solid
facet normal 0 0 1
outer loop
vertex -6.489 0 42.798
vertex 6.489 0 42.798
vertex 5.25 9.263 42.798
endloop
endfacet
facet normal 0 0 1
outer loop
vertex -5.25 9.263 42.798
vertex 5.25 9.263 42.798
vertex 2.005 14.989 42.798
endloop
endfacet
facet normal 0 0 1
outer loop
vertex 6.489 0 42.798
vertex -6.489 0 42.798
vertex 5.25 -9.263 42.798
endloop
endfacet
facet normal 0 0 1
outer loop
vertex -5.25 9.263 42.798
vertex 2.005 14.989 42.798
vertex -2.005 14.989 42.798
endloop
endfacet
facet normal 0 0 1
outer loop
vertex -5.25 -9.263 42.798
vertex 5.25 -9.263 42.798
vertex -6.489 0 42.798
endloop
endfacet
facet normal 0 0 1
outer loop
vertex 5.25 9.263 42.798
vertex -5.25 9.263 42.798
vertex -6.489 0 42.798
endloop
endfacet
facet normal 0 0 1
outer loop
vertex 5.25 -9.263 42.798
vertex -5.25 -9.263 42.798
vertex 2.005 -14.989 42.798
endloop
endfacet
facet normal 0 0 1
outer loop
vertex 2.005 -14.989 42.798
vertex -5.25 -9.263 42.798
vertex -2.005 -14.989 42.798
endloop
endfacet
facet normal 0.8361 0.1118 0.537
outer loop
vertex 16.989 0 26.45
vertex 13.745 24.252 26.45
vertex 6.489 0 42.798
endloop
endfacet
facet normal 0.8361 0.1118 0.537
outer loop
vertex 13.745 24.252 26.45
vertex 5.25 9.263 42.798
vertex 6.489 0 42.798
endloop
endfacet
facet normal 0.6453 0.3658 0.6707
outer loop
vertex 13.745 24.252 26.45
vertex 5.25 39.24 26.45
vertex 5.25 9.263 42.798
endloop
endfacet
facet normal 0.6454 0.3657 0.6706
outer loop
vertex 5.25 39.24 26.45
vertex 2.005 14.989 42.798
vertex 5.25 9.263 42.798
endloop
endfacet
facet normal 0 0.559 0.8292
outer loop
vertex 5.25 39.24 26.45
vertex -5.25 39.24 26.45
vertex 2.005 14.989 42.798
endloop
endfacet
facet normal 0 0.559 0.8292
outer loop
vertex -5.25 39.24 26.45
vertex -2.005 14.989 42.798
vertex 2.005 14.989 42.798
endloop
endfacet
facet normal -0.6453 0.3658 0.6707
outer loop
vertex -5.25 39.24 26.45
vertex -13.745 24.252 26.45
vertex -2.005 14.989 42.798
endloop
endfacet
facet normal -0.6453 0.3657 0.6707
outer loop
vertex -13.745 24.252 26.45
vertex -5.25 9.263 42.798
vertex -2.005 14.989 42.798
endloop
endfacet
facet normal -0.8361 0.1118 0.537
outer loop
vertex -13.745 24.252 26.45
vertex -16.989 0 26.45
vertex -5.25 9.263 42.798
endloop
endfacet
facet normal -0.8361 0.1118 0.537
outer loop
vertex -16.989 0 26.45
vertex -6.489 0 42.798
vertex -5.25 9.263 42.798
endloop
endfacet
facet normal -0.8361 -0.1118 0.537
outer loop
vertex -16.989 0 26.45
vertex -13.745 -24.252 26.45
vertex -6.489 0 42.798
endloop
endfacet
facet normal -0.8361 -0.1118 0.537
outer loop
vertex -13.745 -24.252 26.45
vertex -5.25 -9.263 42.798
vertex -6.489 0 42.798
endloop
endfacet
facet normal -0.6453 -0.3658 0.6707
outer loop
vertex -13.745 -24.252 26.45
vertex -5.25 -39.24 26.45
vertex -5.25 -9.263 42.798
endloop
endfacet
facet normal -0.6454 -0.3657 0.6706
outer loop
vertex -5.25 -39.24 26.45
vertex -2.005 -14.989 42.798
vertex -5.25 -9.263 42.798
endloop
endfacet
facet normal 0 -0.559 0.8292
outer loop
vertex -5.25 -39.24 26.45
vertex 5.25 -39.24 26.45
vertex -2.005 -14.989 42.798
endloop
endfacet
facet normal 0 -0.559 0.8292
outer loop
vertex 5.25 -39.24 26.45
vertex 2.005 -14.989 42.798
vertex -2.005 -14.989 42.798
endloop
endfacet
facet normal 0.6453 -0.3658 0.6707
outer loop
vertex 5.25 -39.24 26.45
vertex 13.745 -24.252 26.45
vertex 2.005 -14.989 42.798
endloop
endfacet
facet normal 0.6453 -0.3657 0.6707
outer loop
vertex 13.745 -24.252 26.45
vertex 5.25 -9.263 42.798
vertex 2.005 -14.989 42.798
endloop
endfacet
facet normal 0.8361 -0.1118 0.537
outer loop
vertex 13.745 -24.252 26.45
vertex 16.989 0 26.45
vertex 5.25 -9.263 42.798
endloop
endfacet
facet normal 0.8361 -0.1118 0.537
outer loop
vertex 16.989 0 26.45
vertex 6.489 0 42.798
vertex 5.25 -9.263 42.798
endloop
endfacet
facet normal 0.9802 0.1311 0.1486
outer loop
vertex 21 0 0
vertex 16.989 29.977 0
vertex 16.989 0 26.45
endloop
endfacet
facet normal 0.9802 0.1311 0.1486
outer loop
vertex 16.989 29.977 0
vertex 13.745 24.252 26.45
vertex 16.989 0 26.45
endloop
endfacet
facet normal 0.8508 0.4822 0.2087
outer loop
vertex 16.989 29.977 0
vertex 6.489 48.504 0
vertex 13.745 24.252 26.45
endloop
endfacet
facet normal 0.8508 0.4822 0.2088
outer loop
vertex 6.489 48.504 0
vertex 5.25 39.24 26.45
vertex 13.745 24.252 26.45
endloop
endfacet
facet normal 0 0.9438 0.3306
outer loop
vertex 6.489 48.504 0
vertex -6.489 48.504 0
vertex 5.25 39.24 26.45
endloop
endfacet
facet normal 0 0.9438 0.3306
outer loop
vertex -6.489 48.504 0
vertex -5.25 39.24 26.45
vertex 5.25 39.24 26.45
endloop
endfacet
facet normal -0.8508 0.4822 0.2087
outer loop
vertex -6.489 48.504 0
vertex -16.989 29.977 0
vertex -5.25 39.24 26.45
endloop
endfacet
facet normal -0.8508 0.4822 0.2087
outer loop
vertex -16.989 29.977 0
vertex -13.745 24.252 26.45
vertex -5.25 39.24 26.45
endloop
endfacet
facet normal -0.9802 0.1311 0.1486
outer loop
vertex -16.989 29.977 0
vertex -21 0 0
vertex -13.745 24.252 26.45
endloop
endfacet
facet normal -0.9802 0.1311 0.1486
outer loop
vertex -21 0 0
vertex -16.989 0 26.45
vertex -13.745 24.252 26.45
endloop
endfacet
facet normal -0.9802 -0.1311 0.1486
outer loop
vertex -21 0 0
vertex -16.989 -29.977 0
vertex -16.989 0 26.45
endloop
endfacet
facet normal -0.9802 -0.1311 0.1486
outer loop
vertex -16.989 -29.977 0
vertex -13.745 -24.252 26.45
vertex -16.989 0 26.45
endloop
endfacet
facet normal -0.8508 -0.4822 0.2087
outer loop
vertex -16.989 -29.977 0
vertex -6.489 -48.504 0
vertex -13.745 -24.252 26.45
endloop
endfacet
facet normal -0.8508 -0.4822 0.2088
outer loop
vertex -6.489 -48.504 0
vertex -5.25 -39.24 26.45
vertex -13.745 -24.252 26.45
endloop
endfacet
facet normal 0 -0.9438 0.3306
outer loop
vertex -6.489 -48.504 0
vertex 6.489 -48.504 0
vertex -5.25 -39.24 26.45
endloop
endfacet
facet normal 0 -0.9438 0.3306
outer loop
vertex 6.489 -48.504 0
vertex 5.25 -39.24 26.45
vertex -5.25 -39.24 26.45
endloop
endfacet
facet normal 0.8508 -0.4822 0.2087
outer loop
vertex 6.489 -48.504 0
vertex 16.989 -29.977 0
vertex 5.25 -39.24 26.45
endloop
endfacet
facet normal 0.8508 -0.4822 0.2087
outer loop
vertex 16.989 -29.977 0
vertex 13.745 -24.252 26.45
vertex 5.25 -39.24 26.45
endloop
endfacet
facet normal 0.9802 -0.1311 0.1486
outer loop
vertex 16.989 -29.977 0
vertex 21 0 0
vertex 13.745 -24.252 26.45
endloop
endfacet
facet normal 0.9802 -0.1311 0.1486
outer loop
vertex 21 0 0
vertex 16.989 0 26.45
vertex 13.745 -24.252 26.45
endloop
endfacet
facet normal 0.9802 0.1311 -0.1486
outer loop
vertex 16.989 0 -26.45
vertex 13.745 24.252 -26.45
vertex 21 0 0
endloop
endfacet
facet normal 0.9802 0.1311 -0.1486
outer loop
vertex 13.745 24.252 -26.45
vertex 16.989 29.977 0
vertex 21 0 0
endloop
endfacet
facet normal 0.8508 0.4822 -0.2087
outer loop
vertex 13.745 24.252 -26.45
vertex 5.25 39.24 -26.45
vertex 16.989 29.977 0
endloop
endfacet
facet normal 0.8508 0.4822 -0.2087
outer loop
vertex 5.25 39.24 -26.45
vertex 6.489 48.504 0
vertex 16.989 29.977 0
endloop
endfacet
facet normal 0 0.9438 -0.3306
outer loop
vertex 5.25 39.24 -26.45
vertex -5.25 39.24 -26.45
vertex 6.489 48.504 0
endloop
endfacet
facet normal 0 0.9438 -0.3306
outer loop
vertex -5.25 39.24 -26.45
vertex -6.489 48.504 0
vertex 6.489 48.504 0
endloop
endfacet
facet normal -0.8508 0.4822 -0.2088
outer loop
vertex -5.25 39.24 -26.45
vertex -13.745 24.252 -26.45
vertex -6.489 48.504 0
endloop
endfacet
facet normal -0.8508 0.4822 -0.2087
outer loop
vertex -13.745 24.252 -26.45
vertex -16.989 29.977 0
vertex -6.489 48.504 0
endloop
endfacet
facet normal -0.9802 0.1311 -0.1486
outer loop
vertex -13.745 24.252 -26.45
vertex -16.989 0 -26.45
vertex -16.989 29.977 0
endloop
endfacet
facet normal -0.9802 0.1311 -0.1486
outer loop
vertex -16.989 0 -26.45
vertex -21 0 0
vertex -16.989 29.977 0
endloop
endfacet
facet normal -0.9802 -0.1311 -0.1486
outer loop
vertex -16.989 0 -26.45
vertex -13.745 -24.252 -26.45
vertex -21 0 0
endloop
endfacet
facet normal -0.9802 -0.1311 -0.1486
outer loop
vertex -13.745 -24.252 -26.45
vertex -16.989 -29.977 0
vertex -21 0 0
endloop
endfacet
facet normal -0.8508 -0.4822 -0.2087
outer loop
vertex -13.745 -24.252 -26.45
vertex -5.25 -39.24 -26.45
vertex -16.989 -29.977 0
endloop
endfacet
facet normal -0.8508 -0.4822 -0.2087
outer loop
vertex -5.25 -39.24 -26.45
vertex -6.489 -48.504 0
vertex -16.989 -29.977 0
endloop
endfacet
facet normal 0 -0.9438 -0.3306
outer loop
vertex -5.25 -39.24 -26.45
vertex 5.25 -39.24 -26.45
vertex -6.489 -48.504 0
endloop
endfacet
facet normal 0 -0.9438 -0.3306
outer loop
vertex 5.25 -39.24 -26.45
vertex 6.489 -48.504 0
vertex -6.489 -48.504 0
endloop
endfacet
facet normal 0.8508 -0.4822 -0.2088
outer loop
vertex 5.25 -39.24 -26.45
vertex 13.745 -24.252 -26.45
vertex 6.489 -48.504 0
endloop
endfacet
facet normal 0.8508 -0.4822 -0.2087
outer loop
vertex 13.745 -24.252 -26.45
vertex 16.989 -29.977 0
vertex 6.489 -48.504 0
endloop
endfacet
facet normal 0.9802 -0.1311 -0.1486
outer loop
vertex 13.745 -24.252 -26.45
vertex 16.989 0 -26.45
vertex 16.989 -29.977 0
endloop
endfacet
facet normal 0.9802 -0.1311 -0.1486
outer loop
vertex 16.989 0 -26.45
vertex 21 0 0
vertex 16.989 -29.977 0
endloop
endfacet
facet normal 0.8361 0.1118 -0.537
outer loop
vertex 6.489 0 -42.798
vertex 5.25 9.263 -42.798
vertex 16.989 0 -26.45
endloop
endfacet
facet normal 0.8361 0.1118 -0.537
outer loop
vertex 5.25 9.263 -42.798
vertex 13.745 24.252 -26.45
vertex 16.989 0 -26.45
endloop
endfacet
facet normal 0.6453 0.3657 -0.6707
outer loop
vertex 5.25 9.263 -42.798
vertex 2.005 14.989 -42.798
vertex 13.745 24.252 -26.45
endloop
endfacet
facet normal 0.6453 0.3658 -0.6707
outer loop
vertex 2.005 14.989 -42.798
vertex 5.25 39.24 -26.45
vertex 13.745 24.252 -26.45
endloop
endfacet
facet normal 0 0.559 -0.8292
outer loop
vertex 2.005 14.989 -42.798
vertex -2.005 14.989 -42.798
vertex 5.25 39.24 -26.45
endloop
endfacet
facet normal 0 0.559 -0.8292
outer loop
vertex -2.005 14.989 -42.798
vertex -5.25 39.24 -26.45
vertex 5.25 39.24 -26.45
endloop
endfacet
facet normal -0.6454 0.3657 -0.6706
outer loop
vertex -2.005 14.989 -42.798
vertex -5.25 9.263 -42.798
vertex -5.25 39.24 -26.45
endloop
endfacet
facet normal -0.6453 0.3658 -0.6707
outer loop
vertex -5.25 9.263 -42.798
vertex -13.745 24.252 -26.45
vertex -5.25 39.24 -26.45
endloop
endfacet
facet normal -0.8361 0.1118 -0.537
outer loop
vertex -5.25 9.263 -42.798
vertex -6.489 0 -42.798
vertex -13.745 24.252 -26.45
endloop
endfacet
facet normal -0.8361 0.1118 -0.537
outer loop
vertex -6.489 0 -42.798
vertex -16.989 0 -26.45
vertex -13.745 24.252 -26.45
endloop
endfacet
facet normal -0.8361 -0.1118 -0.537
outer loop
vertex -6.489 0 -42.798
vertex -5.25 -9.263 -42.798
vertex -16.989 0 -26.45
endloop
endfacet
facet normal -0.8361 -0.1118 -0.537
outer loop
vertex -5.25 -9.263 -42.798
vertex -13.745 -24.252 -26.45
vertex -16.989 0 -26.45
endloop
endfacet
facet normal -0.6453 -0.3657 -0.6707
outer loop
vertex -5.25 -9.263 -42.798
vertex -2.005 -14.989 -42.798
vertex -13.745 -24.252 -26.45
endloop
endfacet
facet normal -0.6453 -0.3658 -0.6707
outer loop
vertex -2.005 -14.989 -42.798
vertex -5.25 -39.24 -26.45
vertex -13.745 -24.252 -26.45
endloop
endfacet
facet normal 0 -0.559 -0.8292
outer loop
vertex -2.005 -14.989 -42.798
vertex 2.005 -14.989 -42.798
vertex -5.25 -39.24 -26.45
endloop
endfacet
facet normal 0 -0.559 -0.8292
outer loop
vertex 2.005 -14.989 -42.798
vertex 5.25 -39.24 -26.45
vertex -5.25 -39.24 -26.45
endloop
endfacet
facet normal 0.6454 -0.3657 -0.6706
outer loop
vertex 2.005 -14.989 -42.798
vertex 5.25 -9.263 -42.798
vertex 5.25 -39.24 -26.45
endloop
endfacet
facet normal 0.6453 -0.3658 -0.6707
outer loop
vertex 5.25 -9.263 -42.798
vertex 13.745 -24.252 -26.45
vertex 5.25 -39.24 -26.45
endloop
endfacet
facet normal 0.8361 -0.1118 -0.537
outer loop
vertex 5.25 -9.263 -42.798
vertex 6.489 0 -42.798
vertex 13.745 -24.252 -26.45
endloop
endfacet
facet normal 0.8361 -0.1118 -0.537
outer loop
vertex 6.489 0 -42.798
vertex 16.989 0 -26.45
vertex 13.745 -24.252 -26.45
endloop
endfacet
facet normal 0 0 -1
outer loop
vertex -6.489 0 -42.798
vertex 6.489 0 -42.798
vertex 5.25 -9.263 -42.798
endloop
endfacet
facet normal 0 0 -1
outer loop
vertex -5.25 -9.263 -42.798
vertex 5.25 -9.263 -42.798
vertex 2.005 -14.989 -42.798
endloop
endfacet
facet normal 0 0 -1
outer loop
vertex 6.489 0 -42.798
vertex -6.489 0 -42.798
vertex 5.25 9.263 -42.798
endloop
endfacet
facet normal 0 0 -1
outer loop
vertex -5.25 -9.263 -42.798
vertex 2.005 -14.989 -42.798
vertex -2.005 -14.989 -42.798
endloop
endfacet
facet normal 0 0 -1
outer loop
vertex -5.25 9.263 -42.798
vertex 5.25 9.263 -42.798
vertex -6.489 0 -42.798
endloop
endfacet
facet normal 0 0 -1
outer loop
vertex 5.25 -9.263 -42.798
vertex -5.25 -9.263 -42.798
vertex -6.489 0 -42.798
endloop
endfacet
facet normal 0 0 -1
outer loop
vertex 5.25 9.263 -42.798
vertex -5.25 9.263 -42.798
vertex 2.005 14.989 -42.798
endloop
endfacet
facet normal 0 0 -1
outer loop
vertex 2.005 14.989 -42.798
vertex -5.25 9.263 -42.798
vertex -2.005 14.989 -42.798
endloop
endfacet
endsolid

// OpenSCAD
// Generated by SolidPython 1.0.1 on 2020-07-29 00:46:48


scale(v = [7, 17, 15]) {
	sphere(r = 3);
}
/***********************************************
*********      SolidPython code:      **********
************************************************
 
# import packages: SolidPython
from solid import *
from solid.utils import *
from itertools import chain, combinations, permutations


class Resize:

    def __init__(self, scad_file):
        self.scad_file = scad_file
        #self.scad_file = import_scad(scad_file)
        # cone/cylinder param:
        self.r1 = 0
        self.r2 = 0
        self.h = 0
        # rectangular prism param:
        self.w = 0
        self.l = 0
        # ellipse param:
        self.r = 0

    # import OpenScad code (file name corresponds to shape)


    # classify shape + parameters
    def assign(self, param1, param2, param3):
        if self.scad_file == 'cone.scad':
            self.r1 = param1
            self.r2 = param2
            self.h = param3
        elif self.scad_file == 'cylinder.scad':
            self.r1 = param1
            self.r2 = param2
            self.h = param3
        elif self.scad_file == 'rectangularPrism.scad':
            self.h = param1
            self.l = param2
            self.w = param3
        else:
            self.r = param1
            self.h = param2

    # resize parameters
    def iterate(self):
        x = range(3, 20, 2)
        i = 1
        if self.scad_file == 'cone.scad':
            tempList = list(permutations(x, 2))
            for temp in tempList:
                param1 = temp[0]
                param2 = temp[1]
                filepath = 'produced_scad_files/' + 'cone' + str(param1) + '_' + str(param2) + '_' + '.scad'
                scad_render_to_file(cylinder(h=param1, r1=param2, r2=0), filepath)

        elif self.scad_file == 'cylinder.scad':
            tempList = list(permutations(x, 3))
            for temp in tempList:
                param1 = temp[0]
                param2 = temp[1]
                filepath = 'produced_scad_files/' + 'cylinder' + str(param1) + '_' + str(param2) + '_' + '.scad'
                scad_render_to_file(cylinder(h=param1, r1=param2, r2=param2), filepath)

        elif self.scad_file == 'rectangularPrism.scad':
            tempList = list(permutations(x, 3))
            for temp in tempList:
                param1 = temp[0]
                param2 = temp[1]
                param3 = temp[2]
                filepath = 'produced_scad_files/' + 'rectangularPrism' + str(param1) + '_' + str(param2) + '_' + str(
                    param3) + '.scad'
                scad_render_to_file(cube(size=(param1, param2, param3)), filepath)

        elif self.scad_file == 'ellipse.scad':
            tempList = list(permutations(x, 4))
            for temp in tempList:
                param1 = temp[0]
                param2 = temp[1]
                param3 = temp[2]
                param4 = temp[3]
                filepath = 'produced_scad_files/' + 'ellipse' + str(param1) + '_' + str(param2) + '_' + str(param3) + '_' + str(param4) + '.scad'
                scad_render_to_file(scale([param1, param2, param3])(sphere(r=param4)), filepath)

    def render_to_scadfile(self):
        scad_render_to_file(scad, 'example.scad') 
 
************************************************/
